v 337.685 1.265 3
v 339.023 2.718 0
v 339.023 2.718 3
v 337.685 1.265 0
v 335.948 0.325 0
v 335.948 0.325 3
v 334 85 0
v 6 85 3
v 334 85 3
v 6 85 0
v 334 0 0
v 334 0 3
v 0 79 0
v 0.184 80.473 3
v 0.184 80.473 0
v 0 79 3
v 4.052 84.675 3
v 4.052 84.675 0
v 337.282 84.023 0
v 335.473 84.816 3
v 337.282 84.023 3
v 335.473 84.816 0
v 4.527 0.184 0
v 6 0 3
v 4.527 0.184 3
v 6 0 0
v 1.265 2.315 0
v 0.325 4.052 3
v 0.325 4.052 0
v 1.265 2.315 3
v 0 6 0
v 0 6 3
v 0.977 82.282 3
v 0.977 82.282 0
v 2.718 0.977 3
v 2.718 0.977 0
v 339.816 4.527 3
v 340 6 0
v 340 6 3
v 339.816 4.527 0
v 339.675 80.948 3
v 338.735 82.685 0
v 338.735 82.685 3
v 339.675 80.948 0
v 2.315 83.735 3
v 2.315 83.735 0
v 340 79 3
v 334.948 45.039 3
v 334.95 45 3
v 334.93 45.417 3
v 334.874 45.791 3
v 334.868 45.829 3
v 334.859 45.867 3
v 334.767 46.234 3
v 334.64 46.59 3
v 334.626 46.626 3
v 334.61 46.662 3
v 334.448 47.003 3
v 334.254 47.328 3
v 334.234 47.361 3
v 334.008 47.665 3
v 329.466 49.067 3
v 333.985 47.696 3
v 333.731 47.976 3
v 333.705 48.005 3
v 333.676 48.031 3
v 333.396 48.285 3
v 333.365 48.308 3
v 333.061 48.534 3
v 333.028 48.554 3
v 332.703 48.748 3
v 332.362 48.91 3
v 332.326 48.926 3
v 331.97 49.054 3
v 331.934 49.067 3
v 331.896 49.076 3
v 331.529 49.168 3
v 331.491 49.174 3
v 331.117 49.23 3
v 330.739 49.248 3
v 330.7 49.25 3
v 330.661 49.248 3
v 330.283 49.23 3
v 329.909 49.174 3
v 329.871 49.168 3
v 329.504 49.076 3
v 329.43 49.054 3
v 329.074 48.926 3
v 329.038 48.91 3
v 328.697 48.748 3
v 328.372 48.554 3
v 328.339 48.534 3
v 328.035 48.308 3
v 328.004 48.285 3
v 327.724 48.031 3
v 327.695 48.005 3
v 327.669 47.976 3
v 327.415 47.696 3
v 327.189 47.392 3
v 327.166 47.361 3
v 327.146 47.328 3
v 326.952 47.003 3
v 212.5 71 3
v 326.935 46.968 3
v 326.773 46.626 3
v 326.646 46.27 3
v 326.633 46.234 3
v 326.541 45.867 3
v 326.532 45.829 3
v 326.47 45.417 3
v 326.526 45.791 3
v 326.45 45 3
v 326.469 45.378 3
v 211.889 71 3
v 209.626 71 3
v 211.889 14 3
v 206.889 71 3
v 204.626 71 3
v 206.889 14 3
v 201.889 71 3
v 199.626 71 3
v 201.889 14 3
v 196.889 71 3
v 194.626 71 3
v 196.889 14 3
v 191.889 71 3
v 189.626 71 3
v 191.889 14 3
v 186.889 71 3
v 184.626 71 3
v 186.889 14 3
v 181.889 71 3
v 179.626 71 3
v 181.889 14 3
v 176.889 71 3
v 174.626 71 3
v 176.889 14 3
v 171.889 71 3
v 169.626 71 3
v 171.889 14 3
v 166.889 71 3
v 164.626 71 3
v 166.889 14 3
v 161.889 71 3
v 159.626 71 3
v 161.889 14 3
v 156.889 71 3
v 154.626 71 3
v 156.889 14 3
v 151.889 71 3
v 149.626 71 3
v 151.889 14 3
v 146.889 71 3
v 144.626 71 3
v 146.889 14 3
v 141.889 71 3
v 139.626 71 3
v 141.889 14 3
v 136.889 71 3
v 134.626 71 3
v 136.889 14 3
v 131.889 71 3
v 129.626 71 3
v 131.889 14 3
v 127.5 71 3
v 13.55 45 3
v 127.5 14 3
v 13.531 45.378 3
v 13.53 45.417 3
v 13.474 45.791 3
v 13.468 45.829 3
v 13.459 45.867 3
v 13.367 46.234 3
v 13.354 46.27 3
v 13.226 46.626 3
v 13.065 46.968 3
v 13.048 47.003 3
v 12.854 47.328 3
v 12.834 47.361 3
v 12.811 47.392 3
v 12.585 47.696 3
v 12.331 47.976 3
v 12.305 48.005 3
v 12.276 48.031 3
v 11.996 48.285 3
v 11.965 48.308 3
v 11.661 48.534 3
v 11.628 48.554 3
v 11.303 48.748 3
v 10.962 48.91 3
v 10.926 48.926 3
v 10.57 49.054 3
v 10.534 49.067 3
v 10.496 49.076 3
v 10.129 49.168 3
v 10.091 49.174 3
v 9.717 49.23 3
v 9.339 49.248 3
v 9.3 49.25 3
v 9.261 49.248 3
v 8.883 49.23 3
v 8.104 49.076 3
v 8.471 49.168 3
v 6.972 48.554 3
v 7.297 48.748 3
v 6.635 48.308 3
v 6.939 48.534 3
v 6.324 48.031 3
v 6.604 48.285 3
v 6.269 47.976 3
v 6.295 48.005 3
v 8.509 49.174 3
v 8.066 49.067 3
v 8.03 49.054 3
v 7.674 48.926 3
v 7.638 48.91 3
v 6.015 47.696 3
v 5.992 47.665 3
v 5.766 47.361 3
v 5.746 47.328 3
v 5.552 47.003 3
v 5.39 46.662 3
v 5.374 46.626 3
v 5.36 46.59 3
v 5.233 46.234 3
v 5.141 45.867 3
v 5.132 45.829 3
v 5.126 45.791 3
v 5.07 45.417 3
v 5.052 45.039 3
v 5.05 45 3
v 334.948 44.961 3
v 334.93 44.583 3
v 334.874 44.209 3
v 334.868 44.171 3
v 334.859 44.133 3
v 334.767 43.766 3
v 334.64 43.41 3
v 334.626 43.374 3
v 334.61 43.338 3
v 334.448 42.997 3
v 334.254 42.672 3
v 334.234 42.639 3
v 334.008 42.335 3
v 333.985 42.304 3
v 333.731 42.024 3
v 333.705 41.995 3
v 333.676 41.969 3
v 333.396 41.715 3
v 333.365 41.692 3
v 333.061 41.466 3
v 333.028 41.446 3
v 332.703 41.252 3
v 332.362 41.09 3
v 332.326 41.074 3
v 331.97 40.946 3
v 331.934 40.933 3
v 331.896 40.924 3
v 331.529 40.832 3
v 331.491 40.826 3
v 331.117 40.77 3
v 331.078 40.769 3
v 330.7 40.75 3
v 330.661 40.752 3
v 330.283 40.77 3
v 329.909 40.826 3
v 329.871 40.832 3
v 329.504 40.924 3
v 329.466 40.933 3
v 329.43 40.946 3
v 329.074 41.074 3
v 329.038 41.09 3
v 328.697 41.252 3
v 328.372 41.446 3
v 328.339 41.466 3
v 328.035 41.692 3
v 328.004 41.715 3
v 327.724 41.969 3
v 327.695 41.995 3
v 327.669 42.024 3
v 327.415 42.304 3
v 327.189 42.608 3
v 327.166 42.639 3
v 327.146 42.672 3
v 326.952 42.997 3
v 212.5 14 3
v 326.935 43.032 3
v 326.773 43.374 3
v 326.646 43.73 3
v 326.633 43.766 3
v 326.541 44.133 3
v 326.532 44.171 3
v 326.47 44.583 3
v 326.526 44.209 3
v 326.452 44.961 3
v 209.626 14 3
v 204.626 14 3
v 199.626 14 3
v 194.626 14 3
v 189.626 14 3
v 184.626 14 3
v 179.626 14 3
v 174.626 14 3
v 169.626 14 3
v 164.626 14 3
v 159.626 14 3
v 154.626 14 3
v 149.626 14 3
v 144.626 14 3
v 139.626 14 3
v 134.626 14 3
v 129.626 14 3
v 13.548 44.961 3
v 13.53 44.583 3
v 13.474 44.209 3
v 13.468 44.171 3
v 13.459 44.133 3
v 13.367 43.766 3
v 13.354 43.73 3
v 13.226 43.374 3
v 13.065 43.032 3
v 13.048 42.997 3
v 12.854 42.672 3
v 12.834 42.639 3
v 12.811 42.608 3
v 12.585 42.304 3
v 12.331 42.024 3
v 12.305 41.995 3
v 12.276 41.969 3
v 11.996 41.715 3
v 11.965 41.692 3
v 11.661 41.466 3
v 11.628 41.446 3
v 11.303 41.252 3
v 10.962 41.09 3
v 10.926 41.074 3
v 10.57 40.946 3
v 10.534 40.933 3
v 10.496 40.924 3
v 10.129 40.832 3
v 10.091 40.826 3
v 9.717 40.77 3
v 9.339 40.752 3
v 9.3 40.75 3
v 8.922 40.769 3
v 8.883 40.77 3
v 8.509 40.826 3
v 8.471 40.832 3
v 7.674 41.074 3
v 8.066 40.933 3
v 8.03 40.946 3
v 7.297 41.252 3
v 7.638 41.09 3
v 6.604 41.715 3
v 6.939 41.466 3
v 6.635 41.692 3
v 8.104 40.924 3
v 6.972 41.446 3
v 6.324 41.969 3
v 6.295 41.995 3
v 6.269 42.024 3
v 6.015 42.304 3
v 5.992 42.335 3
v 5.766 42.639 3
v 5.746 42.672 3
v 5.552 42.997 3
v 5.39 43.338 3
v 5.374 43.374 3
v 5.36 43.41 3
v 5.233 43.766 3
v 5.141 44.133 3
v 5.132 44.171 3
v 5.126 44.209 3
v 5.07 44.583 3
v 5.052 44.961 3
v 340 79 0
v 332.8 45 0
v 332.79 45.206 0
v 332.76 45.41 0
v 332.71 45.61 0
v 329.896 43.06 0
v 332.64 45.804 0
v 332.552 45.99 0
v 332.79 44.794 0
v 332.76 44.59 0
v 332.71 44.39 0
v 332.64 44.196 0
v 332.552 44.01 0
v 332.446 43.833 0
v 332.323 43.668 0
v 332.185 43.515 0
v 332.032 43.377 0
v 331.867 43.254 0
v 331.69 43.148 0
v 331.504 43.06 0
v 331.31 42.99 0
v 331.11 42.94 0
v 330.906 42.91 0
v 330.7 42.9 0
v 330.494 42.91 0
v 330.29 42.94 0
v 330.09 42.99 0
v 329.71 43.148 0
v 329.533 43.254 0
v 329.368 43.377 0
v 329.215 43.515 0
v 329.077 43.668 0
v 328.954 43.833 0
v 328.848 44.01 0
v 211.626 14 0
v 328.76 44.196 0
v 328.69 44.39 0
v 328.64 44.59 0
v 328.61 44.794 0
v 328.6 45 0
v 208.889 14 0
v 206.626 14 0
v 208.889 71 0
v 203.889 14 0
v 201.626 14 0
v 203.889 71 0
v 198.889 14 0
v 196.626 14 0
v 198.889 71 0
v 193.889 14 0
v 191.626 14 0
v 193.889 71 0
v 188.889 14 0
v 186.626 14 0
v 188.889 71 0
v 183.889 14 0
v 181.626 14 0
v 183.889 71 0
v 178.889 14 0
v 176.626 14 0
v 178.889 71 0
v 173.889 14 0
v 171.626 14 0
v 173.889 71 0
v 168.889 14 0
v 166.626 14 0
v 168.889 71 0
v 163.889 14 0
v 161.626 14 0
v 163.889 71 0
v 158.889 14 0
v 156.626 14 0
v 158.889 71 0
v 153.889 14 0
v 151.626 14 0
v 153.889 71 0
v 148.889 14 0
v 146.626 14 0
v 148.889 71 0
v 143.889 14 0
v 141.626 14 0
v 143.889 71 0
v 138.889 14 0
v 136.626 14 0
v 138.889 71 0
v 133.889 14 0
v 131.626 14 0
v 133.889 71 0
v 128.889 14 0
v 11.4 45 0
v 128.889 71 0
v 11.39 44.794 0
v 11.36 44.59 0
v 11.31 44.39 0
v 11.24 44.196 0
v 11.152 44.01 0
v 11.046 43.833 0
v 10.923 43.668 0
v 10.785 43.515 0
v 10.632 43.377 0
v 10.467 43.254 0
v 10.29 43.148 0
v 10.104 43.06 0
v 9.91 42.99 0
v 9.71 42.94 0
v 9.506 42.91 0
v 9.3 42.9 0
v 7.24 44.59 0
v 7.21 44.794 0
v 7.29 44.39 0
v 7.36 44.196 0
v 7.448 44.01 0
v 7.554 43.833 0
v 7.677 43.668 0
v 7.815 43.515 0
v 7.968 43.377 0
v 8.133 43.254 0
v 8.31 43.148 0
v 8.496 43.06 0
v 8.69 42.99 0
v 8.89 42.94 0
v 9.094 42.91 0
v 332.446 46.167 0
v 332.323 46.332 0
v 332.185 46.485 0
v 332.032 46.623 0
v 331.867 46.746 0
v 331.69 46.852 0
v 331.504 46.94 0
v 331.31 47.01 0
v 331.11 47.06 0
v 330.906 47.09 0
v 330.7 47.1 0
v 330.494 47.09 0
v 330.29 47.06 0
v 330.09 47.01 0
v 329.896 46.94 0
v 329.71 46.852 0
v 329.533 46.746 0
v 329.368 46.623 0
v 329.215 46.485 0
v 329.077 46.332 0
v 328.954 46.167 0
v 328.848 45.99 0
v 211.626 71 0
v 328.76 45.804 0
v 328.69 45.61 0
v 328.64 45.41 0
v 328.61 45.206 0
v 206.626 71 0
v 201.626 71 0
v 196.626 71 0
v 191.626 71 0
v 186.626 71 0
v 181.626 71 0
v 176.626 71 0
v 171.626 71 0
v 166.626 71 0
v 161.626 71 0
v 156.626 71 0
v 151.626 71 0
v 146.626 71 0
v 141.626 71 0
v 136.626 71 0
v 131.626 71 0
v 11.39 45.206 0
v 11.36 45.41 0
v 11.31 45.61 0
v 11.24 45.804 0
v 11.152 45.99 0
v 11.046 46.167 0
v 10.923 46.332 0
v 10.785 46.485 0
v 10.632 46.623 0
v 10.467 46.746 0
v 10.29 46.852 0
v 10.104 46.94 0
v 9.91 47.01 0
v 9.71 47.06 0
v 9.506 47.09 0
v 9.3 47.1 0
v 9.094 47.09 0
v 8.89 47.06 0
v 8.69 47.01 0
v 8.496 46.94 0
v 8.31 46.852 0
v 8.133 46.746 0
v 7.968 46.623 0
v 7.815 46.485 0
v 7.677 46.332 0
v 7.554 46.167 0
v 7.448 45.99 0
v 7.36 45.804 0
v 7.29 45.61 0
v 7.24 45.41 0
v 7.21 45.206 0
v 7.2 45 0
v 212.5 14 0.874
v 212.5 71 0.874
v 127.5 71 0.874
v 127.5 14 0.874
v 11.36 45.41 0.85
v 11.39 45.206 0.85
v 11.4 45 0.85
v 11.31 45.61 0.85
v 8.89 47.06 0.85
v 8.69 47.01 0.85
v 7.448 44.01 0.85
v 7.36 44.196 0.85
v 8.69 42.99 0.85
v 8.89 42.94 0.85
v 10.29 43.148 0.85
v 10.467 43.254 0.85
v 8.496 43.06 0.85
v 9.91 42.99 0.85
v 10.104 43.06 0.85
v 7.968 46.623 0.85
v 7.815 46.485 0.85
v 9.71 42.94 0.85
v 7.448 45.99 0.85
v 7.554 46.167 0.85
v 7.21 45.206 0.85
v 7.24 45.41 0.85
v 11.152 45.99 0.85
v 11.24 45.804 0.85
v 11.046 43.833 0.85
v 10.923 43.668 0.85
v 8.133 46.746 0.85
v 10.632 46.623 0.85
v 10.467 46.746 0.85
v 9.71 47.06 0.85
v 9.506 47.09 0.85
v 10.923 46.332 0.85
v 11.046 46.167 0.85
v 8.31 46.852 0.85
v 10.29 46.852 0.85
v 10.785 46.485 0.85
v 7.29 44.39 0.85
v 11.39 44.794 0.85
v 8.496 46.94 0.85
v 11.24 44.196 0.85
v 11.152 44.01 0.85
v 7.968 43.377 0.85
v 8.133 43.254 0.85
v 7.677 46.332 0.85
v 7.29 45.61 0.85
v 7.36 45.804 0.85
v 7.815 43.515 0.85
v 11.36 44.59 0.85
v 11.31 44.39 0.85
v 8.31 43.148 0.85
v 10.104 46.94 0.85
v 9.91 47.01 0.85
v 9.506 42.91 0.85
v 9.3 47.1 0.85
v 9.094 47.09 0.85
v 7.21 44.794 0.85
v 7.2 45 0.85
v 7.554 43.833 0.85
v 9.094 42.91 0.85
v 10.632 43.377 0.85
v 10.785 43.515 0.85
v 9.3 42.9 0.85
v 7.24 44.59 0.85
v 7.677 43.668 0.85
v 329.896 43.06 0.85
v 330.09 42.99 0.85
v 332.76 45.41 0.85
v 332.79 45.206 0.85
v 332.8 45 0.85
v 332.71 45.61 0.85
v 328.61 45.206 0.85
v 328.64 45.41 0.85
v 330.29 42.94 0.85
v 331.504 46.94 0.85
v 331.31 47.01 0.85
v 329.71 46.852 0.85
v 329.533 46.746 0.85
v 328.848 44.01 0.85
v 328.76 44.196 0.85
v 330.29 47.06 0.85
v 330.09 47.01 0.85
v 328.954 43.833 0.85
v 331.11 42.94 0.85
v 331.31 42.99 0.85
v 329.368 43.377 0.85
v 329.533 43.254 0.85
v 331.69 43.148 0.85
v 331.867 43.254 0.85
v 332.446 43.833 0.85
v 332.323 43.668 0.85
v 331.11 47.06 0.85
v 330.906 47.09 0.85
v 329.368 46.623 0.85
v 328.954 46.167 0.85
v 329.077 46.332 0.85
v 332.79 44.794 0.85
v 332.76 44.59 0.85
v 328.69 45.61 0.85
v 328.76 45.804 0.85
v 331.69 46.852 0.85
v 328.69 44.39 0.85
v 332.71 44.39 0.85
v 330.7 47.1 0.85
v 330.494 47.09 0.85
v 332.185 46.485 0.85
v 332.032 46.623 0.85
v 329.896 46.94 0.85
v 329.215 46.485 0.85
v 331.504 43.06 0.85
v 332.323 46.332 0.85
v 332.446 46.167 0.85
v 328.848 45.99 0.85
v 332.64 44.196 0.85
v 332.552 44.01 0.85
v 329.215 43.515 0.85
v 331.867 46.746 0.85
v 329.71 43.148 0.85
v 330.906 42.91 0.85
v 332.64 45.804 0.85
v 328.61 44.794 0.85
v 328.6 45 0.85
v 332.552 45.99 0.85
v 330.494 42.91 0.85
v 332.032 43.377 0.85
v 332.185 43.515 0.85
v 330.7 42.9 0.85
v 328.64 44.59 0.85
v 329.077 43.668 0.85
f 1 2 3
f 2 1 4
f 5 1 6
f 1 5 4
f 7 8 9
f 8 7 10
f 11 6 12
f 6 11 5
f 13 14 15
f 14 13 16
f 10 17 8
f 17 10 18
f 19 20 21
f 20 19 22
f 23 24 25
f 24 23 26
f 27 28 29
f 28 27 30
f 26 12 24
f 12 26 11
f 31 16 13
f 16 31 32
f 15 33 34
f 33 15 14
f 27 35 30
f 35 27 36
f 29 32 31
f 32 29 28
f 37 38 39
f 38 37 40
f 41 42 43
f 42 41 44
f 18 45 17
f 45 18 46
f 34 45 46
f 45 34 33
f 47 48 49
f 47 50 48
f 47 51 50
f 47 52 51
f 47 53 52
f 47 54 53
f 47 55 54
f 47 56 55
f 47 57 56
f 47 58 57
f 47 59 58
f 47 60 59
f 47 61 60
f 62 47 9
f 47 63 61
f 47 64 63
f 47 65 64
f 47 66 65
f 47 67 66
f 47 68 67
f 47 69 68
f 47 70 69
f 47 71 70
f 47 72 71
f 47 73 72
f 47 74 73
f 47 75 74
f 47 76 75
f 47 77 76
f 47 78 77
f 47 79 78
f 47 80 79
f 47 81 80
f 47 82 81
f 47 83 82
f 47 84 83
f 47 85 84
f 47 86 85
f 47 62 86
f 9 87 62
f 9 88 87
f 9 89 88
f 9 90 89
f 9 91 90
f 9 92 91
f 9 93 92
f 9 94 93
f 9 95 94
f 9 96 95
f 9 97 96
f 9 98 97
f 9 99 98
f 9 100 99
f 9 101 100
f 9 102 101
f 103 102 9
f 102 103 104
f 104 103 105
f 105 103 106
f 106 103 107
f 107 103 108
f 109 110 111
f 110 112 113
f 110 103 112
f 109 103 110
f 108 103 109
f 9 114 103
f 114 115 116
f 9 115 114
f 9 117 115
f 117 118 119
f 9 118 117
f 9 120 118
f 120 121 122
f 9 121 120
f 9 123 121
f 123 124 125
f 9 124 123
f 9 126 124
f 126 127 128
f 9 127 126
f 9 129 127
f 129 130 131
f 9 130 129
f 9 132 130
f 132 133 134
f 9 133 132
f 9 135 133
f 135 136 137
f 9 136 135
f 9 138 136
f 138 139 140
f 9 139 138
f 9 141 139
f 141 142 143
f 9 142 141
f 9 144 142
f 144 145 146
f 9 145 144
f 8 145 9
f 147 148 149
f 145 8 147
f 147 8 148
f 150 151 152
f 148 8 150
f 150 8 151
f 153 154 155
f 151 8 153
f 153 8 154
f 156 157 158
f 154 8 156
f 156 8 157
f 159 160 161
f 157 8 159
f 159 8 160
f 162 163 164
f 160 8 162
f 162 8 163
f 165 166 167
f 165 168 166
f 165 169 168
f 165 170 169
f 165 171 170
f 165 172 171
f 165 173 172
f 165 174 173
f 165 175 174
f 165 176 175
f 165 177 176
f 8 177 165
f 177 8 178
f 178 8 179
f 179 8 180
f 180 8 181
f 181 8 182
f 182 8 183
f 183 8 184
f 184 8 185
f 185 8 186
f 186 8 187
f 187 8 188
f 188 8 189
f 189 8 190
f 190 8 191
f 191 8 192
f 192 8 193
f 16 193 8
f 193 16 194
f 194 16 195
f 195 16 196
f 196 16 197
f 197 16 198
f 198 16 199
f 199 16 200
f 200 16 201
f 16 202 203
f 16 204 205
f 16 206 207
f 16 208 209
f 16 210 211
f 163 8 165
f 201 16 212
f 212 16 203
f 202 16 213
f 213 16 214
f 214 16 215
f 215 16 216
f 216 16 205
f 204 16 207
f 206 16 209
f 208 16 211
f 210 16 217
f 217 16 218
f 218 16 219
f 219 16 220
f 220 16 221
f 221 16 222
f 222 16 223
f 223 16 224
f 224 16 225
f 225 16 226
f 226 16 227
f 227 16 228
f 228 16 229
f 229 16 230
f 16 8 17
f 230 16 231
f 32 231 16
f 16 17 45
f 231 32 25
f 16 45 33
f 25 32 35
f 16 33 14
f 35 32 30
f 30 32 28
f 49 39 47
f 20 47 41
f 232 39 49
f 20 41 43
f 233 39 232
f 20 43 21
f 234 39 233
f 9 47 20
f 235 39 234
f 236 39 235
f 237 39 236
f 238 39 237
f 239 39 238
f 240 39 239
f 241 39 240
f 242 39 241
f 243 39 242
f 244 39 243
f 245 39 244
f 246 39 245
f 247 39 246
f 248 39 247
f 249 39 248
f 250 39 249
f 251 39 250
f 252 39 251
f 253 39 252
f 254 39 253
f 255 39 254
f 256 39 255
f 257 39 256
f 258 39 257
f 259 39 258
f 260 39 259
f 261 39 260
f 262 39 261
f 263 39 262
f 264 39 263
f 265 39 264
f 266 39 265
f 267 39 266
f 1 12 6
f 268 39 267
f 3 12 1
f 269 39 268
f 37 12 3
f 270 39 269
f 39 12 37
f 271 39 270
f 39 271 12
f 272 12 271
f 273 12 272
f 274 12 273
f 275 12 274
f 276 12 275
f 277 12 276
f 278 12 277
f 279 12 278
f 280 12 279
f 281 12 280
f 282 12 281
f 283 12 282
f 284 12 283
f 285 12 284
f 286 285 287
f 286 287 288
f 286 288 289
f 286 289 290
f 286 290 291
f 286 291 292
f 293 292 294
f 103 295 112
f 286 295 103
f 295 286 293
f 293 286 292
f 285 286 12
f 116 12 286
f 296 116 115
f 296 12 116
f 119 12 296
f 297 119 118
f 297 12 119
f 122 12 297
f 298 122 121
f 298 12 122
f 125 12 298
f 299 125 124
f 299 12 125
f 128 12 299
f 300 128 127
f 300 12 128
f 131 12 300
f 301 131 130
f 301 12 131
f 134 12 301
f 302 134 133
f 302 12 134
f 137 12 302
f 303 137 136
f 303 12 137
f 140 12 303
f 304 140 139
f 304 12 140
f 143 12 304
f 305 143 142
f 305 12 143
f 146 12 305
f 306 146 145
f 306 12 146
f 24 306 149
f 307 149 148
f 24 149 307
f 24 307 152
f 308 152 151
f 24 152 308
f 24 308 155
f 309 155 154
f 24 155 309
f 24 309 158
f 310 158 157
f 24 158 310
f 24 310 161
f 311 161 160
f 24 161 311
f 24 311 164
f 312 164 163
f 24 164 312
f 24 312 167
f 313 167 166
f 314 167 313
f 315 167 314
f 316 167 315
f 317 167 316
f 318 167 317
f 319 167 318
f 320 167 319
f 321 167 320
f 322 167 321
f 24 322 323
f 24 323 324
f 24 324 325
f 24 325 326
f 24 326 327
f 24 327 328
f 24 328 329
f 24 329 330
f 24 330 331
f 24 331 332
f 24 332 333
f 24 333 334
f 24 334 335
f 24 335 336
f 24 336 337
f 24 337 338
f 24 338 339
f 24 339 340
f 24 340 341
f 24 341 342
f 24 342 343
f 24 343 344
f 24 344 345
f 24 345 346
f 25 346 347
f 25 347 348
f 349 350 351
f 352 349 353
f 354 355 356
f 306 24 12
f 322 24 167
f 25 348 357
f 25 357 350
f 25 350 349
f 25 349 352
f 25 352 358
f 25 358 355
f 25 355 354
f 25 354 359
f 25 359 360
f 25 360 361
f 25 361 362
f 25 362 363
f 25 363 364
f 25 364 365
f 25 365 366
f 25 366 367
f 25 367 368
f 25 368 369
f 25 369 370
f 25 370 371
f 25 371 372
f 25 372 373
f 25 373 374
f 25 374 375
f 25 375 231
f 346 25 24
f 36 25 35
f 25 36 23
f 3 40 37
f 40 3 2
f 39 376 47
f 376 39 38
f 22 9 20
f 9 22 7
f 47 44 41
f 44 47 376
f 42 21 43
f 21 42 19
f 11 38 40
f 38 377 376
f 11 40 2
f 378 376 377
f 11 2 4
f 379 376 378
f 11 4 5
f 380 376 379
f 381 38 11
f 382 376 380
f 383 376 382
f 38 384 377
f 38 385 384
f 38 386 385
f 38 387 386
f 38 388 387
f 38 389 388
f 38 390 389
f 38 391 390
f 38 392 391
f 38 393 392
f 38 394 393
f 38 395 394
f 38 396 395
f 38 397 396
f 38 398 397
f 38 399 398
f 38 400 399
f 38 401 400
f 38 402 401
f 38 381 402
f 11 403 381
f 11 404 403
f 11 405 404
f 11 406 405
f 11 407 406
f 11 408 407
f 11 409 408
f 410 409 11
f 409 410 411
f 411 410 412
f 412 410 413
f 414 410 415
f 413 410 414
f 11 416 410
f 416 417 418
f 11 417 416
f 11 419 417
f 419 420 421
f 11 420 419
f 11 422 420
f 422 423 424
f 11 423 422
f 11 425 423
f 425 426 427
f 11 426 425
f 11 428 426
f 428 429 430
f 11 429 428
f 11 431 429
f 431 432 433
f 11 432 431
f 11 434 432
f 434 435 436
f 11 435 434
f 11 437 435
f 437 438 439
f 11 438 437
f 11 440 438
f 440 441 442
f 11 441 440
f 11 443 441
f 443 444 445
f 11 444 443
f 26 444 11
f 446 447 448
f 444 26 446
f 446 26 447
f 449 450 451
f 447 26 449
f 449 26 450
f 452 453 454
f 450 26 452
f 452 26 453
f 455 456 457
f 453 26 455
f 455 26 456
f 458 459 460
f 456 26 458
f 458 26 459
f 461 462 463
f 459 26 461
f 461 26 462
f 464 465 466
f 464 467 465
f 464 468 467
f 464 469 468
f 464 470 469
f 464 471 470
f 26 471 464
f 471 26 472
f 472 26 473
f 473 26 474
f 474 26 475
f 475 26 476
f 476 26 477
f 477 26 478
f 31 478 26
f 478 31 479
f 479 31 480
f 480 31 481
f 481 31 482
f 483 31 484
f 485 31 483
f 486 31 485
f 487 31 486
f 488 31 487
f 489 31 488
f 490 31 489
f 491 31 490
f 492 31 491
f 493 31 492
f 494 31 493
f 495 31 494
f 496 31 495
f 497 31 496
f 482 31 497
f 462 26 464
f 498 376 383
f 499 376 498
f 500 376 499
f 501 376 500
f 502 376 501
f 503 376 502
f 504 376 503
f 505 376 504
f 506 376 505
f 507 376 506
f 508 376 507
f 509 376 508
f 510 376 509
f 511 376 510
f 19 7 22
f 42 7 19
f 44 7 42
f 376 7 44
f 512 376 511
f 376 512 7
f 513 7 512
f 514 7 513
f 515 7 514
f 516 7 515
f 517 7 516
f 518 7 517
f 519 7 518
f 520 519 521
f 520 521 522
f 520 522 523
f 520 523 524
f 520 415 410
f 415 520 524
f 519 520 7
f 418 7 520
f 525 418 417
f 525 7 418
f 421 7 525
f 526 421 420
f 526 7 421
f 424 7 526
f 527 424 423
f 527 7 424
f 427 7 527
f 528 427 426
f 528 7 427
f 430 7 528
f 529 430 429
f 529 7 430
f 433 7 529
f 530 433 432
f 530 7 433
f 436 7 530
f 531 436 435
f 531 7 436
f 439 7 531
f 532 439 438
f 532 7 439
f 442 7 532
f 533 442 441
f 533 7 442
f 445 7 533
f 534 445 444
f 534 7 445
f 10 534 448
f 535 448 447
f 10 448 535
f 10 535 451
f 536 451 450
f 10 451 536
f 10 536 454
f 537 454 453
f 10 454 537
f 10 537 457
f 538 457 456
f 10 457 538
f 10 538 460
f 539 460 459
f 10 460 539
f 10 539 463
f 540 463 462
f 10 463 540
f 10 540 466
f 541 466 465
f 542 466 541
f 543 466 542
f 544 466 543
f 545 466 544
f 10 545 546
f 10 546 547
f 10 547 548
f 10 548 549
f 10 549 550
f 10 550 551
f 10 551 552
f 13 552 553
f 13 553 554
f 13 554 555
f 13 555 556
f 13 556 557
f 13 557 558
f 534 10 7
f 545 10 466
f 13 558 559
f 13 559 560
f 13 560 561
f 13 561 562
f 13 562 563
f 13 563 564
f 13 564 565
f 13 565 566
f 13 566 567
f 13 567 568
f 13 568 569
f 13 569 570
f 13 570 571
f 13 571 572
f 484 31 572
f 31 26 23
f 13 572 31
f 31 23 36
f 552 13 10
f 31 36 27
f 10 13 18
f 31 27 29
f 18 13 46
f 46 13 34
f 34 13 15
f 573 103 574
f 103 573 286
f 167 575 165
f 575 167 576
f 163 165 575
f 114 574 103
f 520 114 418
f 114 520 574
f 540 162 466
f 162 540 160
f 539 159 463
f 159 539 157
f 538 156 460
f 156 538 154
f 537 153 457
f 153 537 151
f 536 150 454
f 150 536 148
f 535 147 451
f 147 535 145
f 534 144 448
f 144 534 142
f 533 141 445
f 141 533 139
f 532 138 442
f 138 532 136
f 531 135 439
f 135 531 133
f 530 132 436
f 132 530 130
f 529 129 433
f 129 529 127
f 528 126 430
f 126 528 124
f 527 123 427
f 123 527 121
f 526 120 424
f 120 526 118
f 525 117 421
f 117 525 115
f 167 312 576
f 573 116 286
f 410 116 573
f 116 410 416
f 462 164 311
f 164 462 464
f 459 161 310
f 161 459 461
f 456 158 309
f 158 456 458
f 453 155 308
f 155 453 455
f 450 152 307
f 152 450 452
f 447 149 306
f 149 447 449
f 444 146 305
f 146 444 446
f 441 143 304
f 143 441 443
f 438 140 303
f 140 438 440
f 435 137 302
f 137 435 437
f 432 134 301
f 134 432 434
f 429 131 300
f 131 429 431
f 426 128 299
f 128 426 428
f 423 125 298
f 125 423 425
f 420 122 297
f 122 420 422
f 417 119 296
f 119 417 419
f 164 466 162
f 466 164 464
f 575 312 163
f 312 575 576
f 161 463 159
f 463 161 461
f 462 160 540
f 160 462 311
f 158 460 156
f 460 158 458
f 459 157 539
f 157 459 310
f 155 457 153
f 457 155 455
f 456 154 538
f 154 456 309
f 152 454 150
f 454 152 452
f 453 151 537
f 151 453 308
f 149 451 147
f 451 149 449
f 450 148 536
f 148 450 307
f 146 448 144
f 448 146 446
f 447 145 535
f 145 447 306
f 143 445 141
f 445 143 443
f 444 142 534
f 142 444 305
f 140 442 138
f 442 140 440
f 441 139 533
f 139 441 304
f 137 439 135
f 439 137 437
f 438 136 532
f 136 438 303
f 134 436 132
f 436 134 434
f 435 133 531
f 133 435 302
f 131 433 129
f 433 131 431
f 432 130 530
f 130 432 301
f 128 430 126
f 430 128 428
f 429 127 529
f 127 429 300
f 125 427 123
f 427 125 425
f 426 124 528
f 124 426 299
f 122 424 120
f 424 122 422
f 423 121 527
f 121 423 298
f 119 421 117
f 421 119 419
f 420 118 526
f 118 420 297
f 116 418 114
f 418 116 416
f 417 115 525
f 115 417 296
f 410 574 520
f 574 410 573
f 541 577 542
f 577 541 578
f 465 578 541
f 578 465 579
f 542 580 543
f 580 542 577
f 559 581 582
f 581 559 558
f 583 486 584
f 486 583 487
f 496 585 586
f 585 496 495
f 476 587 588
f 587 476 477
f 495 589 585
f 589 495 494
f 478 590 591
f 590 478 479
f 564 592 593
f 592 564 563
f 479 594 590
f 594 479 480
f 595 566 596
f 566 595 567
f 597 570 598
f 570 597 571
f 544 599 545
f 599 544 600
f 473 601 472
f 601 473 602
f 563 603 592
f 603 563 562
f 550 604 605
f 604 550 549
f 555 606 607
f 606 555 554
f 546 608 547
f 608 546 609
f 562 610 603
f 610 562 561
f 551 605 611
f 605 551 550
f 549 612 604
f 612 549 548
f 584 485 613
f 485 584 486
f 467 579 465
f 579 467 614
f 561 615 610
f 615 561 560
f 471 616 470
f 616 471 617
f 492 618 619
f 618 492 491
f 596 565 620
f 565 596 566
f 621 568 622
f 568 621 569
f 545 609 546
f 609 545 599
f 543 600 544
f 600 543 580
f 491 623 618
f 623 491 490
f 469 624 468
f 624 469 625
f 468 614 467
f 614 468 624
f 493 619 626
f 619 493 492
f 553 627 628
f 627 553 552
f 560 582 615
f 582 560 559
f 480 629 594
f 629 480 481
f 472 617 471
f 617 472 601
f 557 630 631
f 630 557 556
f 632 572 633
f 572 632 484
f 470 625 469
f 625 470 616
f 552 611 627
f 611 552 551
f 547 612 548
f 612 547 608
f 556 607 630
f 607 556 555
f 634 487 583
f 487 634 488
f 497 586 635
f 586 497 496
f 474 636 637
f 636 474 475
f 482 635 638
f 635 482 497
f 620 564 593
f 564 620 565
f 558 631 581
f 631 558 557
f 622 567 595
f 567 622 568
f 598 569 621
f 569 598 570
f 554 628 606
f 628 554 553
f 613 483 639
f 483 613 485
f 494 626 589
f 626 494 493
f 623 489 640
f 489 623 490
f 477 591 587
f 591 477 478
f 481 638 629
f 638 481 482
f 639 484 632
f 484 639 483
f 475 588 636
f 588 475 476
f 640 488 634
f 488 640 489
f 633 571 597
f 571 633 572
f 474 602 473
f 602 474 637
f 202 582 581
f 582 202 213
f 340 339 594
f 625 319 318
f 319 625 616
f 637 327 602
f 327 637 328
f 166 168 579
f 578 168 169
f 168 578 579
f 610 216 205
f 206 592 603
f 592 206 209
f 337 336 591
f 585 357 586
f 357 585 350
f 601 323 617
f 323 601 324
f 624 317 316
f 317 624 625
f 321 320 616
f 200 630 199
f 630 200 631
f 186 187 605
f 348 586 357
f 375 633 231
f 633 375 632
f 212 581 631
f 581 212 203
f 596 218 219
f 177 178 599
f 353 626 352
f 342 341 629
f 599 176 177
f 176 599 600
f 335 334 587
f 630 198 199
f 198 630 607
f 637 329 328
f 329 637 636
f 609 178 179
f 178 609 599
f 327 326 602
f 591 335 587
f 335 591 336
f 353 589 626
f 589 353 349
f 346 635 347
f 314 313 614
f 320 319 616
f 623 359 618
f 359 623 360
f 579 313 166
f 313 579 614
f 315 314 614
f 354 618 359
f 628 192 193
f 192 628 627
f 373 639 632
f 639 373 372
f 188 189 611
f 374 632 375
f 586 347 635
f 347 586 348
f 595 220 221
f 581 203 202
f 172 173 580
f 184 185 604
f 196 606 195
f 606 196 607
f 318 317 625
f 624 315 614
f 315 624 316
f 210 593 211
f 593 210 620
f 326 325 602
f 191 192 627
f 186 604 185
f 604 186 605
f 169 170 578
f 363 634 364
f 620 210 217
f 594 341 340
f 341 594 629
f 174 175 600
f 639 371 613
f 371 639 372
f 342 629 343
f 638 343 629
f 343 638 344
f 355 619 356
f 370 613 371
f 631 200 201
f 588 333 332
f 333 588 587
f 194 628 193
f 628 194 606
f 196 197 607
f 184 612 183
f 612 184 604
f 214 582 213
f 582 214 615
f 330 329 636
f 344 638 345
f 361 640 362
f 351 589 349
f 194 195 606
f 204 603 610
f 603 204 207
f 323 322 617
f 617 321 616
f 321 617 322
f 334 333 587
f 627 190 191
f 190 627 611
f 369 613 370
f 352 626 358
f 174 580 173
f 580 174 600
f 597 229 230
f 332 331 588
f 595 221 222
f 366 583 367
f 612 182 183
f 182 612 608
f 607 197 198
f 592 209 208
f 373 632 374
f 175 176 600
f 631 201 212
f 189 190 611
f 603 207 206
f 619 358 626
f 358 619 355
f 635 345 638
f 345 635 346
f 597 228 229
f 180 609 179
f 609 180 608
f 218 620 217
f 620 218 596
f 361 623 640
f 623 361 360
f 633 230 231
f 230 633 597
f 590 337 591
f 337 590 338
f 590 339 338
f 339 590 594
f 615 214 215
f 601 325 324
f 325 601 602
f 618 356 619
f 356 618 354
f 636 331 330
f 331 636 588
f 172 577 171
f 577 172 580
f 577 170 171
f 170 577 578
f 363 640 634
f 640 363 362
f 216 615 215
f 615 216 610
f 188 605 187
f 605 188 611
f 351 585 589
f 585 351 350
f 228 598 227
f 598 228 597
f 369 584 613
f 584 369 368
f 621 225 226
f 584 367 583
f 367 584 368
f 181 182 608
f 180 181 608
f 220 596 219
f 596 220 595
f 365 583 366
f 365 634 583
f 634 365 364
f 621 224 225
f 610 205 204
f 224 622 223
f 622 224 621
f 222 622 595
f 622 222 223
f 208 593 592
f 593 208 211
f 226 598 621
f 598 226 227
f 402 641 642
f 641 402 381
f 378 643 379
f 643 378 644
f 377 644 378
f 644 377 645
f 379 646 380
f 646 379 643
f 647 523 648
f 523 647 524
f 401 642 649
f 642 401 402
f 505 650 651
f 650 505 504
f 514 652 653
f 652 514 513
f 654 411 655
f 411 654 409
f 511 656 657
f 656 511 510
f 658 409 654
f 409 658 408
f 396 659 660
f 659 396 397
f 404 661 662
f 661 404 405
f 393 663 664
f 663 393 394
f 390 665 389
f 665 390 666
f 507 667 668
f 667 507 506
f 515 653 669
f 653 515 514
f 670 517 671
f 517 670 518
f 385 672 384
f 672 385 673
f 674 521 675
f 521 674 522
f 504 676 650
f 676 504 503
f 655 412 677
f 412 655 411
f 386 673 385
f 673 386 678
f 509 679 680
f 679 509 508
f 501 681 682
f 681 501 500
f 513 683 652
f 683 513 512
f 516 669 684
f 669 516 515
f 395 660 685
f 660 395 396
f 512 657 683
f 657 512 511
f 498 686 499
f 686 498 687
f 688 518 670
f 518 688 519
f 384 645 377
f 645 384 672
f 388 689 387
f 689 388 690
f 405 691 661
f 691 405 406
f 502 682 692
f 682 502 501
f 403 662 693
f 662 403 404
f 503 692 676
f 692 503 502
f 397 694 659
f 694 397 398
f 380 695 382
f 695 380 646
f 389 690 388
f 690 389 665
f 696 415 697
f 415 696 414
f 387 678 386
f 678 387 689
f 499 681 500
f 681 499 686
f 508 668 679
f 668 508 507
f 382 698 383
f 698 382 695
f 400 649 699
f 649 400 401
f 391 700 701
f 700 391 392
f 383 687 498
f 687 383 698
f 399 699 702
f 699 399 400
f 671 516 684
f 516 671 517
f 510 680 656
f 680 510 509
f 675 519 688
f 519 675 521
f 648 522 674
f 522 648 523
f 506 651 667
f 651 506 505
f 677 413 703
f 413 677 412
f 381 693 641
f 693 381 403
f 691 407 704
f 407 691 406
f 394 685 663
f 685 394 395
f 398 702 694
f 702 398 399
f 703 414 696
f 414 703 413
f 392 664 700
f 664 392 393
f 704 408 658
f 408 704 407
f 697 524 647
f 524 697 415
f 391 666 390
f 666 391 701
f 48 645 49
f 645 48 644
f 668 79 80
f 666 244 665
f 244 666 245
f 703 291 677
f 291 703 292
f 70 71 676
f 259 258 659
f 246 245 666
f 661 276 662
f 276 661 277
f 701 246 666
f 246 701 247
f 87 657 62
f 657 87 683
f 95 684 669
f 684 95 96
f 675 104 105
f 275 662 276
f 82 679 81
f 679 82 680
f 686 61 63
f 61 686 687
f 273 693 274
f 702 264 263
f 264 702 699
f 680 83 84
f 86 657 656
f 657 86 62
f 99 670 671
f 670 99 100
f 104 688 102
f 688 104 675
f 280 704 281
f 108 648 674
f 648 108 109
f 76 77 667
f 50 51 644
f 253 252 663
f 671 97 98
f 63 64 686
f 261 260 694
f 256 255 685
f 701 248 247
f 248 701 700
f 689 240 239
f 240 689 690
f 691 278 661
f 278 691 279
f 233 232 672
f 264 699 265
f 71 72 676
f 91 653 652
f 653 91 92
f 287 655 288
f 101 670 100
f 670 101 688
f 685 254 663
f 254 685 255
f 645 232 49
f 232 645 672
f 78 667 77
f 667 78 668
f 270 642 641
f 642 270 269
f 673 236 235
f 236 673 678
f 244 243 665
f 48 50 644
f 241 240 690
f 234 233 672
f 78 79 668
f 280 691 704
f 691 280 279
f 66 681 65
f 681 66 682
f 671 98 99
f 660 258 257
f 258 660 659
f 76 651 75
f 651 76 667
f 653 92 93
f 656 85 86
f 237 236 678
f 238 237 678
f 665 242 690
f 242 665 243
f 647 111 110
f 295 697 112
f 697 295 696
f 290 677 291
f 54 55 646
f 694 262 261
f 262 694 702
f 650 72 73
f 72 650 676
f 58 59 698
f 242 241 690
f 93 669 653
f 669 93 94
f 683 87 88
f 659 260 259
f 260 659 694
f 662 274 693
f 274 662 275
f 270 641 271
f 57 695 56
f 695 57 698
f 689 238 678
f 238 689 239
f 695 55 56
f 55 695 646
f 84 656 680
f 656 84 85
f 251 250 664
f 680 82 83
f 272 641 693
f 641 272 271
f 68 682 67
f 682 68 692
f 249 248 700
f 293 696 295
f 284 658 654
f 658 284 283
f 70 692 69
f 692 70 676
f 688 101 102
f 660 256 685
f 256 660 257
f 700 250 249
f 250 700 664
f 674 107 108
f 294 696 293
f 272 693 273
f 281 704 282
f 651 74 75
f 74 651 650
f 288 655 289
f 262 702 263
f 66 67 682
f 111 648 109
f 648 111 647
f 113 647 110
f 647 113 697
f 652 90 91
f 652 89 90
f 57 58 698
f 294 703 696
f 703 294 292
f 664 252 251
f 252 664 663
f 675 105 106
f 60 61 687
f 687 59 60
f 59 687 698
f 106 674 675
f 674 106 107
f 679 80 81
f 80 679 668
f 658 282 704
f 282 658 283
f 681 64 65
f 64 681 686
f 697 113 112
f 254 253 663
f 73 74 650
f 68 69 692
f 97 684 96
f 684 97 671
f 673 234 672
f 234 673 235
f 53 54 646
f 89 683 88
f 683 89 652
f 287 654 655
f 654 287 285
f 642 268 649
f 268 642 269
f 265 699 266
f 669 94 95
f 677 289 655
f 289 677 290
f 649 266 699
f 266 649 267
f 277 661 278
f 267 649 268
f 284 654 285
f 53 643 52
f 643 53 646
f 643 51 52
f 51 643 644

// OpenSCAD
// Bathroom toe-kick vent grille: ¾ solid, centered ¼ angled louvers (deflect air right)
// Original parametric design. Units: mm. Matches standard 2¼" × 12" toe-kick faceplate.
// Print: PETG, 0.2mm layers, 4 walls; print flat, front face down for smoothest finish.

/* [Plate] */
W = 340;            // plate width
H = 85;             // plate height
T = 3;              // plate thickness
corner_r = 6;       // corner radius

/* [Screw holes] */
hole_inset_x = 9.3; // hole center from each end
hole_y = 45;        // hole center from bottom
hole_d = 4.2;       // clearance for #6 / M3.5 screw
csk_d = 8.5;        // countersink dia (90°)

/* [Louvered window, centered quarter] */
win_w = 85;         // window width (quarter of plate)
win_margin_y = 14;  // top/bottom margin (matches original grille inset)

/* [Fins] */
fin_t = 1.6;        // fin thickness
fin_pitch = 5.0;    // horizontal spacing (no see-through at 45° in 3mm)
fin_angle = 45;     // deflect exiting air to the right
fin_back = 0;       // 0 = louvers contained within plate thickness

win_x0 = (W - win_w) / 2;
win_x1 = (W + win_w) / 2;
win_y0 = win_margin_y;
win_y1 = H - win_margin_y;
fin_len = (T + fin_back) / cos(fin_angle) + 4;

module plate2d() {
    offset(r = corner_r)
        translate([corner_r, corner_r])
            square([W - 2*corner_r, H - 2*corner_r]);
}

difference() {
    union() {
        // plate with window cut
        difference() {
            linear_extrude(T) plate2d();
            translate([win_x0, win_y0, -1])
                cube([win_x1 - win_x0, win_y1 - win_y0, T + 2]);
        }
        // angled fins, trimmed to window
        intersection() {
            translate([win_x0, win_y0 - 4, -fin_back])
                cube([win_x1 - win_x0, win_y1 - win_y0 + 8, T + fin_back]);
            for (x = [win_x0 - fin_len : fin_pitch : win_x1 + fin_len])
                translate([x, win_y0 - 4, (T - fin_back)/2])
                    rotate([0, fin_angle, 0])
                        translate([-fin_t/2, 0, -fin_len/2])
                            cube([fin_t, win_y1 - win_y0 + 8, fin_len]);
        }
    }
    // countersunk screw holes (front face = z = T)
    for (hx = [hole_inset_x, W - hole_inset_x]) {
        translate([hx, hole_y, -fin_back - 1])
            cylinder(d = hole_d, h = T + fin_back + 2, $fn = 64);
        csk_depth = (csk_d - hole_d) / 2;
        translate([hx, hole_y, T - csk_depth])
            cylinder(d1 = hole_d, d2 = csk_d + 1, h = csk_depth + 0.5, $fn = 64);
    }
}
